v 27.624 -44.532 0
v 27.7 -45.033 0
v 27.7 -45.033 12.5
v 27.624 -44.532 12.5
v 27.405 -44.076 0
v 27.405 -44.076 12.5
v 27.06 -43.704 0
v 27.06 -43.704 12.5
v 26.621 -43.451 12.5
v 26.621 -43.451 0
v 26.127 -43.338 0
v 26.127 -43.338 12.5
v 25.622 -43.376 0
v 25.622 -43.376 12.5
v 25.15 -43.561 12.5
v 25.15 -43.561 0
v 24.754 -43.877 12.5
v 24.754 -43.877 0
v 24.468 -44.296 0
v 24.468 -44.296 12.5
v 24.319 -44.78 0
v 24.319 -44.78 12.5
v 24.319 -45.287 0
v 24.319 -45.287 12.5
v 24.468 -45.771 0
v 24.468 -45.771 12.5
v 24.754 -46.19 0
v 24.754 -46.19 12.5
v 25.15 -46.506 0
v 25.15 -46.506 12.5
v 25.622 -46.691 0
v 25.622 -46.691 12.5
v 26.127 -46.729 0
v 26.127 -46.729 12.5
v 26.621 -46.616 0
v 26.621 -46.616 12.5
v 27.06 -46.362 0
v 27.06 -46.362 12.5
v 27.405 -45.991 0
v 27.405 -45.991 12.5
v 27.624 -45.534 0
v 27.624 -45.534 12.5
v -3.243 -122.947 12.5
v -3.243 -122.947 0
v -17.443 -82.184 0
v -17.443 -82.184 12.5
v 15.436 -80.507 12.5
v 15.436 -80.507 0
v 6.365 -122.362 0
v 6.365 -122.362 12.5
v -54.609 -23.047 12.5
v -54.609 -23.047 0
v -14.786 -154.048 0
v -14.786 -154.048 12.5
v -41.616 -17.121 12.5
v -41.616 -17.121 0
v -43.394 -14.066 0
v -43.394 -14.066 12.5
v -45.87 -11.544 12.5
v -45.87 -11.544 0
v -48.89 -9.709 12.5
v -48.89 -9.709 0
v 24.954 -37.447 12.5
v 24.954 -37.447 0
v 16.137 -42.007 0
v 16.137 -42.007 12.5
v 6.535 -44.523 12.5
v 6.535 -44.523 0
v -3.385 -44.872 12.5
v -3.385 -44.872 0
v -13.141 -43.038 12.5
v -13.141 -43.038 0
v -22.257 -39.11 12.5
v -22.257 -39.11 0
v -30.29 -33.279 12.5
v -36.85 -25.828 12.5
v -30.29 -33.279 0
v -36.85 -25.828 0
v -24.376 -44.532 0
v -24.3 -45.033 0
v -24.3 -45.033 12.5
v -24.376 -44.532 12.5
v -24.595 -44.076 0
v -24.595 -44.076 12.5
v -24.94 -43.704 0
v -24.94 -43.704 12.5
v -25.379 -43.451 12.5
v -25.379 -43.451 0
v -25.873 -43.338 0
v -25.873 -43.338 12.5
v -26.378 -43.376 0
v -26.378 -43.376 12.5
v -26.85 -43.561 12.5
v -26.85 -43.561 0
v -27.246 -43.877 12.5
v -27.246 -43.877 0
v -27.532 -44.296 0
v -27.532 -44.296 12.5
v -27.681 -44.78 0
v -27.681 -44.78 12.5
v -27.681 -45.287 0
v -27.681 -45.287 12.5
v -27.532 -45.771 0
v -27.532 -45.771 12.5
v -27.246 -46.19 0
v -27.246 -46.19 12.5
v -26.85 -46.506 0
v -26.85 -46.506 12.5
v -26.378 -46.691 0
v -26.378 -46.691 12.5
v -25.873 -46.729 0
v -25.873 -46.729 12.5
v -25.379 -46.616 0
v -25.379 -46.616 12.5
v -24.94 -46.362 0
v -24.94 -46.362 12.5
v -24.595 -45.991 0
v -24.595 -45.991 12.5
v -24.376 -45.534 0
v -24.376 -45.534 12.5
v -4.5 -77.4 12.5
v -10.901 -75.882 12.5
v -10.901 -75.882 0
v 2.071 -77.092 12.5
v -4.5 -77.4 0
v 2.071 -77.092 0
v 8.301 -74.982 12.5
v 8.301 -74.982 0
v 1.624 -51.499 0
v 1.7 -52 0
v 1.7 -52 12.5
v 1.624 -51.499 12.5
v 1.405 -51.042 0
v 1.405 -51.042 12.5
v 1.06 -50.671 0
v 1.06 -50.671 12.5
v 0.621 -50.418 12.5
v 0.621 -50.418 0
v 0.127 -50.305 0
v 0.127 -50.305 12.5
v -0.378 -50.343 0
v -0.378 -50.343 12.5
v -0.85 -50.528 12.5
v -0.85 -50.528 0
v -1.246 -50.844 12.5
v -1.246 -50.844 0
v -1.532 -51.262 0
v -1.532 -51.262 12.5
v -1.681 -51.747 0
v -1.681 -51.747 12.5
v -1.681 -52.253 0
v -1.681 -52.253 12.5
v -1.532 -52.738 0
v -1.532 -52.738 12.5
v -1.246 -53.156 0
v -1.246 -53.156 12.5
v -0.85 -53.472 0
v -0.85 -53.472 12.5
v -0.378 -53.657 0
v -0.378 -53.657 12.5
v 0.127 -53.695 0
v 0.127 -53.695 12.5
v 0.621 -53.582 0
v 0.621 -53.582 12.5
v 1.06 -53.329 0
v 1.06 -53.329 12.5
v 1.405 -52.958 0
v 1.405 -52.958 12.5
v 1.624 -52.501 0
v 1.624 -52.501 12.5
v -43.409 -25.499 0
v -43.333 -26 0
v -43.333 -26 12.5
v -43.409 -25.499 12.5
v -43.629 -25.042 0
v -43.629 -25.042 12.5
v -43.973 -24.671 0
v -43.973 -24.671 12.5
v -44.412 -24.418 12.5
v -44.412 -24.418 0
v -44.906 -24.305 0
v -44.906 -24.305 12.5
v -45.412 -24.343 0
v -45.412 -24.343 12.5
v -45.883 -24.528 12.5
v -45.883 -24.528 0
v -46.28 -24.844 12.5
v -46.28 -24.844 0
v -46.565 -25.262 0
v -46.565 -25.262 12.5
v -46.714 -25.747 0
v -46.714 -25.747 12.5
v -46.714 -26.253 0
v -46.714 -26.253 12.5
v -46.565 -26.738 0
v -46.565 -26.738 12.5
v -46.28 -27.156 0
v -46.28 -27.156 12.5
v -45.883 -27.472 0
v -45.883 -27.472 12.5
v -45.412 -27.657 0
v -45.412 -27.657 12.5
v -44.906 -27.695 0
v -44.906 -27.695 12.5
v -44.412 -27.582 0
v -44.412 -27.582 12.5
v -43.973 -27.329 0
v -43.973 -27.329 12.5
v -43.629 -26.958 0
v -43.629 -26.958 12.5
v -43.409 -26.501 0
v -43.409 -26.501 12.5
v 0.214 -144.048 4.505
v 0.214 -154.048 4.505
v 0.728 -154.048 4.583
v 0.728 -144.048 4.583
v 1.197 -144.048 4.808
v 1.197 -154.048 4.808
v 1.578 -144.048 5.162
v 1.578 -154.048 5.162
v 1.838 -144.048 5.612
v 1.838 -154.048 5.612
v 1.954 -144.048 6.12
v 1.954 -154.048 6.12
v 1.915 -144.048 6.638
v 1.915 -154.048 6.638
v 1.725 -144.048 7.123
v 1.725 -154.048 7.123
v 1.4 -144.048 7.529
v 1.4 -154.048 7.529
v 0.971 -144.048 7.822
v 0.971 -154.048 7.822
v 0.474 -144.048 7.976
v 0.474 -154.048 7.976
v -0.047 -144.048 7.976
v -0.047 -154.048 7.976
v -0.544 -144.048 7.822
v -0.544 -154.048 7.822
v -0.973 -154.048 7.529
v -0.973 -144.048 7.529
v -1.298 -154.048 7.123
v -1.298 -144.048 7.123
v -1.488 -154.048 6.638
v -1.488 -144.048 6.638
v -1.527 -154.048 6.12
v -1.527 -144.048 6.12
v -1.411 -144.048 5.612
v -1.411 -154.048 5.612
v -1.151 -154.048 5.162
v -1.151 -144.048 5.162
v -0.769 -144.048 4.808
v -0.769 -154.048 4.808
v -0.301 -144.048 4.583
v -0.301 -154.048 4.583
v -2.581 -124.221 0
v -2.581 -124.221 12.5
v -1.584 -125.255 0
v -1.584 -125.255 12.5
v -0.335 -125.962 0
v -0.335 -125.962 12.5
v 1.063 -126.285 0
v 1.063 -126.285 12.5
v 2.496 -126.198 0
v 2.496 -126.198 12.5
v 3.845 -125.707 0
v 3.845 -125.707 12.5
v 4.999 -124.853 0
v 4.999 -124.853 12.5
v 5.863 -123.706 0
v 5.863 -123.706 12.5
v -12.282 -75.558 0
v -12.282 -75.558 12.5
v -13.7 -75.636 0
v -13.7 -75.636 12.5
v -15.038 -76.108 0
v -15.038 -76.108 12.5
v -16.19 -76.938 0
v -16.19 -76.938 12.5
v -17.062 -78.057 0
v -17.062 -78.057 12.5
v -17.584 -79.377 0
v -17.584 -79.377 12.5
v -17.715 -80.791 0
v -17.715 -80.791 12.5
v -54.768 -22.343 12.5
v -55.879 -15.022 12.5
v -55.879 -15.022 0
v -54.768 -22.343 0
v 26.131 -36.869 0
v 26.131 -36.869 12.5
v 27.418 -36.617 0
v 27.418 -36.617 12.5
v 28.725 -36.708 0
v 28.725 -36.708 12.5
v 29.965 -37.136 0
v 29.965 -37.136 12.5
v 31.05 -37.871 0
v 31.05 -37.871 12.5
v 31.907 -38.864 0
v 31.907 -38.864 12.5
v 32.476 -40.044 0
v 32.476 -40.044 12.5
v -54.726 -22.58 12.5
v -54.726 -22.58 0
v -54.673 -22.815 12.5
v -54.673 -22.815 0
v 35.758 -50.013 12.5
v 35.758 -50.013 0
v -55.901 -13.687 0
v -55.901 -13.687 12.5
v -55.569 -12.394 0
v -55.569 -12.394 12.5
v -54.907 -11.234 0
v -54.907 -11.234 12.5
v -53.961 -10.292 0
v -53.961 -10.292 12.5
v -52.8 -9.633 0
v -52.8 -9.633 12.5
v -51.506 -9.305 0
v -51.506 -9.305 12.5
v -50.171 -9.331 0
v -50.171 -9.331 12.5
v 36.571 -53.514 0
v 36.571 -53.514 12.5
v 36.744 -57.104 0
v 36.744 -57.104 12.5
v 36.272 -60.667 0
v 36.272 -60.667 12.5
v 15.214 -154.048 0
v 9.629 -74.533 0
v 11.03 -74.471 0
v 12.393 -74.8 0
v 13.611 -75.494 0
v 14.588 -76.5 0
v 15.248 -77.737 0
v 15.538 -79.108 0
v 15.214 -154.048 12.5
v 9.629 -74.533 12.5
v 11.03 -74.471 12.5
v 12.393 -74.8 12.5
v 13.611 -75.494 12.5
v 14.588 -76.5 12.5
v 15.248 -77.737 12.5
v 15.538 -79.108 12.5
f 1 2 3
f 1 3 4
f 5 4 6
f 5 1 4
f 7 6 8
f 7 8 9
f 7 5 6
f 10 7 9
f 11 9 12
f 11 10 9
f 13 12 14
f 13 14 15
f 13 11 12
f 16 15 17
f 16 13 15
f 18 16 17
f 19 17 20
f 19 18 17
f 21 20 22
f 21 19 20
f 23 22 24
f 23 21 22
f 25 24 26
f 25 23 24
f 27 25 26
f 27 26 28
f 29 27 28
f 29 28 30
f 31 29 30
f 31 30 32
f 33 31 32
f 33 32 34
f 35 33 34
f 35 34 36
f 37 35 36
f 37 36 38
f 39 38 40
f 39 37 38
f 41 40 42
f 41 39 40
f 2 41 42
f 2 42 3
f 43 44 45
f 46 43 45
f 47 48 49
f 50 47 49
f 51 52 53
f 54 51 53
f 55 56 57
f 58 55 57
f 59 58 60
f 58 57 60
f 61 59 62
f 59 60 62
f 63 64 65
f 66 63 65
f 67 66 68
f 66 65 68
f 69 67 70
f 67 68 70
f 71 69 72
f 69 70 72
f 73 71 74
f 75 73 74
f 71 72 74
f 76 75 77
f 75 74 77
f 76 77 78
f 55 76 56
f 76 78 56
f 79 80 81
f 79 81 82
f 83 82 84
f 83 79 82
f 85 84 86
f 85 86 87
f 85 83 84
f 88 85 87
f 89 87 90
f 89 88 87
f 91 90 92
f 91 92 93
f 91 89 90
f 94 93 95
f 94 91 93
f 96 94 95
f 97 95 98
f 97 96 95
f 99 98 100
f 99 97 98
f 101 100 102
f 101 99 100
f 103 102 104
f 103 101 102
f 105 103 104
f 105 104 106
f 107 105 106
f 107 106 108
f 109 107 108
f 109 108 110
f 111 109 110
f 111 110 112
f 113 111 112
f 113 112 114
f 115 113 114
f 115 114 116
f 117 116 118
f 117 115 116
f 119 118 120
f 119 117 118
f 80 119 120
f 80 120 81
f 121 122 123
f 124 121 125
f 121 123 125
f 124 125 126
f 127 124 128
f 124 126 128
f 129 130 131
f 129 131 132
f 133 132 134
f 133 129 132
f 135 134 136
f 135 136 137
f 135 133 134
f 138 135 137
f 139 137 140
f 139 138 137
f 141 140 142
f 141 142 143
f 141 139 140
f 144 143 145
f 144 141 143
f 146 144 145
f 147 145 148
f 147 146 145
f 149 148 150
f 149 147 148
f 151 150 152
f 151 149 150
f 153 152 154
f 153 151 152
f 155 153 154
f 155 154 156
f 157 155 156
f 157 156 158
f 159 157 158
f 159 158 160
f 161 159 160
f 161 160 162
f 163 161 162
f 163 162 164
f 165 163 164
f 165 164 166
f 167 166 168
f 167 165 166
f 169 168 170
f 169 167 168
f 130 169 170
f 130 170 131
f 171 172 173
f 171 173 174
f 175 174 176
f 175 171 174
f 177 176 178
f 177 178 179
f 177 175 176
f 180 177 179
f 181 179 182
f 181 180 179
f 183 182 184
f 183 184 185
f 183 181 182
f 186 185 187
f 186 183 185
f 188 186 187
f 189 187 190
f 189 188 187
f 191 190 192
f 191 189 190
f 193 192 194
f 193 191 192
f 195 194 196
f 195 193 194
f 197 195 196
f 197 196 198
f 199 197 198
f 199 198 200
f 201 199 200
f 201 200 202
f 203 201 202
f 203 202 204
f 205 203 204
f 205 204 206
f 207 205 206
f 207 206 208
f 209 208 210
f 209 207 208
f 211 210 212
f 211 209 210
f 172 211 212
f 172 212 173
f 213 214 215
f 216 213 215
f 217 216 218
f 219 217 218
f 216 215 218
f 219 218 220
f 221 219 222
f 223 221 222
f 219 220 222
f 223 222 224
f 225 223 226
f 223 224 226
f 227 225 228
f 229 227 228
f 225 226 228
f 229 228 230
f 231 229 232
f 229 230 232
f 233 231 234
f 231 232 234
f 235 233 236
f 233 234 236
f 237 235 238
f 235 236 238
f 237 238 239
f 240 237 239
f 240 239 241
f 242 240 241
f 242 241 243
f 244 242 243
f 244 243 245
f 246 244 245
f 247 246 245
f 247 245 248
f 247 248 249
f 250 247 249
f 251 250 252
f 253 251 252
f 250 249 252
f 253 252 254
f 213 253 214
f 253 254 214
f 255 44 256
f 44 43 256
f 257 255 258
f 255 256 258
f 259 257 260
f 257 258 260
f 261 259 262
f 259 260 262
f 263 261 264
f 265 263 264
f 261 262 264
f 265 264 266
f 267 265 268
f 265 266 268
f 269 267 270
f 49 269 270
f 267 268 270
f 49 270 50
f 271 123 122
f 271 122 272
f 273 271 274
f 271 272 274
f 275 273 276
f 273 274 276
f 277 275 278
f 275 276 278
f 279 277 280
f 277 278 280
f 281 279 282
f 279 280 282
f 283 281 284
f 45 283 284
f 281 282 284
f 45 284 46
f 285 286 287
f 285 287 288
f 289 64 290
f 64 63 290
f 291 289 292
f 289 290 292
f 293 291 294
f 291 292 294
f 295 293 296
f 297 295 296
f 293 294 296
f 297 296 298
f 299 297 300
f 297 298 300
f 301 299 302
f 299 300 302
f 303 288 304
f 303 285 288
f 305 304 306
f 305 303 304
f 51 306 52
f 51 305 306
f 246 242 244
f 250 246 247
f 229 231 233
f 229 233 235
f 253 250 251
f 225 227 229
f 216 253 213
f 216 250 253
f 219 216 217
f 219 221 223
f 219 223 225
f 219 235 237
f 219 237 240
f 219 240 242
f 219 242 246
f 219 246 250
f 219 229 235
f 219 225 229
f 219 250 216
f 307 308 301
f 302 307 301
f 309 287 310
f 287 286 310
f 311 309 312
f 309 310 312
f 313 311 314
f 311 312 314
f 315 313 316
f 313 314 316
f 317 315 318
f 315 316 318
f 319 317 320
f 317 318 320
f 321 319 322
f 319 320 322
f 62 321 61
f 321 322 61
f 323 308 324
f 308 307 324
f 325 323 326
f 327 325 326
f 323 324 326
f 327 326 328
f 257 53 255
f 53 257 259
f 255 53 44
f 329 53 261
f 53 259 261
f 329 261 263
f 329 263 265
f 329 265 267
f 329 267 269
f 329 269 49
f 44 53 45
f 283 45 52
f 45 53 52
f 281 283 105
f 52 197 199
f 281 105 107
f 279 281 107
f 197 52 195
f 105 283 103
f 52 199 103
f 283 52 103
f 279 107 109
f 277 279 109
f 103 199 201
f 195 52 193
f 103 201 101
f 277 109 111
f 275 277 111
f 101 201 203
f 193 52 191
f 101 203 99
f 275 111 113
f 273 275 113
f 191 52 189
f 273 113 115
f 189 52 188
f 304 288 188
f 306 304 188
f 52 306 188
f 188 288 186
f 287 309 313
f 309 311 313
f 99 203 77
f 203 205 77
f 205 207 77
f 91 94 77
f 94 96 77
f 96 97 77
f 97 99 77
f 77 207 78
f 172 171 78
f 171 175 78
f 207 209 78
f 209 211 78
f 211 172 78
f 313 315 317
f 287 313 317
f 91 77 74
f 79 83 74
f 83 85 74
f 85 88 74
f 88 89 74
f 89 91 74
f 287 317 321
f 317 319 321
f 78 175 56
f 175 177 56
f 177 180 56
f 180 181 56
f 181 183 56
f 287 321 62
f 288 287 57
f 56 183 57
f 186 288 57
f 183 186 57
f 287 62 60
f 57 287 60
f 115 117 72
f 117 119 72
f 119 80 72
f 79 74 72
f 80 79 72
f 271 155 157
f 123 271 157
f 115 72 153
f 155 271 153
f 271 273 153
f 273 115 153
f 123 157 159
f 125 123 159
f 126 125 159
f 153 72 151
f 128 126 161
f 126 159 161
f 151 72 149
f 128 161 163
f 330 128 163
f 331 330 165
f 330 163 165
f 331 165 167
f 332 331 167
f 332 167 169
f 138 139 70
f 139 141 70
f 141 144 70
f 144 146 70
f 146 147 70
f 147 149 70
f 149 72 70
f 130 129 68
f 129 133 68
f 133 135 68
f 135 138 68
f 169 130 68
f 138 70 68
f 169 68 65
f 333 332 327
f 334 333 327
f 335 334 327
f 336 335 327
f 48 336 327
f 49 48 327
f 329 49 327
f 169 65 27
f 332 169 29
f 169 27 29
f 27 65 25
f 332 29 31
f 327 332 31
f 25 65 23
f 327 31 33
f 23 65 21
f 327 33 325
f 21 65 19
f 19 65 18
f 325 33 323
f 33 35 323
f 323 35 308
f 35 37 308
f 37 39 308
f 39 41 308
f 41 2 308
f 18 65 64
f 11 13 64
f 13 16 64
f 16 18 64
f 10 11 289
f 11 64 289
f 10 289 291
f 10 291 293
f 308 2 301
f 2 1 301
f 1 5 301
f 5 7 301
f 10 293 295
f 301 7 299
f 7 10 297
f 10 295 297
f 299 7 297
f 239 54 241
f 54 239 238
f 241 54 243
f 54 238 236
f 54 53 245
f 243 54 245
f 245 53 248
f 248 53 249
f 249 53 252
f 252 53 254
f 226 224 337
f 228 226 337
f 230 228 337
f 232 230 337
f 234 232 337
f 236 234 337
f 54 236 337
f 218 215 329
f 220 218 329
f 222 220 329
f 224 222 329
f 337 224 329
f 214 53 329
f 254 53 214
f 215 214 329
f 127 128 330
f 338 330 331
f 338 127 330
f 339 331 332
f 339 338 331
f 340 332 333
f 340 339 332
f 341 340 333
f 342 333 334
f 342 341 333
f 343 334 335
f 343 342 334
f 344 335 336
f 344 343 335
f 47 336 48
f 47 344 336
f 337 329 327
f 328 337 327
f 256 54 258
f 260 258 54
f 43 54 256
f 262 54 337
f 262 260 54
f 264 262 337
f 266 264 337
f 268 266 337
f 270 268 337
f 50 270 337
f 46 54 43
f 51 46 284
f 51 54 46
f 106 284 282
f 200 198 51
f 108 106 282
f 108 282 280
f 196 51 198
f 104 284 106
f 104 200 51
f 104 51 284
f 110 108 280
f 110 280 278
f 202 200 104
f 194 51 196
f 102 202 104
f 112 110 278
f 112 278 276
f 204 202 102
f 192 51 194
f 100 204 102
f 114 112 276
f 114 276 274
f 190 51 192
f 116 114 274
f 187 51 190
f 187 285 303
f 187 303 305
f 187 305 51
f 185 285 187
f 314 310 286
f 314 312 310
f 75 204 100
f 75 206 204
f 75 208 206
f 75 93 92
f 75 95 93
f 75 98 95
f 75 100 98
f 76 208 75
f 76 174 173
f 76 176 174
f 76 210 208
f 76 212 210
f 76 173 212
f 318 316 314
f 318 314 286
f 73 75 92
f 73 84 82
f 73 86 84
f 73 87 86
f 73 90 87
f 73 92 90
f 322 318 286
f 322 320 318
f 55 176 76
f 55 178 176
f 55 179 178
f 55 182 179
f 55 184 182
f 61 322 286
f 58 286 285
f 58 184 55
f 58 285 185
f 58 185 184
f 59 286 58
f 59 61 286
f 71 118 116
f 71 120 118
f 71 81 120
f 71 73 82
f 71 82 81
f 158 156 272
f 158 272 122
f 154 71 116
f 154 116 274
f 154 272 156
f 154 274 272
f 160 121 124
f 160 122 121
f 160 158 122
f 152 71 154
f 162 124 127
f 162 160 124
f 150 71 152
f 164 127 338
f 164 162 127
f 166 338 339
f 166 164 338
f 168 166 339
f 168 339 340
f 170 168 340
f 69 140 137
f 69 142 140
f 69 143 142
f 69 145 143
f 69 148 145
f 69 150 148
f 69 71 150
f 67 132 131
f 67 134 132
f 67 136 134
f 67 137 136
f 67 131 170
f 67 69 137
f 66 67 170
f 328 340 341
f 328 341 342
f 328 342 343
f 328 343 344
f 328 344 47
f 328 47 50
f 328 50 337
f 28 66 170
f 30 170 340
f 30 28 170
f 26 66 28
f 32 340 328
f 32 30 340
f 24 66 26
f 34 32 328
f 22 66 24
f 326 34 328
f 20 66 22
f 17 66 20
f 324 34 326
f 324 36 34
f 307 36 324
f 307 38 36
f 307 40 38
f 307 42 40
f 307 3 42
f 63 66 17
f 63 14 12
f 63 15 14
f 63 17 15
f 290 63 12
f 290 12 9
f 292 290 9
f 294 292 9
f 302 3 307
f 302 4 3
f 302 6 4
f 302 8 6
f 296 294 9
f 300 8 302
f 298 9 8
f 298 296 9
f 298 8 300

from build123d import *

# Parameters (mm, degrees)
SKETCH1_R           = 1.7
BOSS_EXTRUDE1_DEPTH = 12.5
FILLET4_R           = 5
FILLET5_R           = 5
FILLET6_R           = 5
FILLET7_R           = 20
SKETCH2_R           = 1.745
CUT_EXTRUDE1_DEPTH  = 10
CUT_EXTRUDE2_DEPTH  = 35
FILLET8_R           = 5
FILLET9_R           = 5


with BuildPart() as part:
    # Sketch1 → Boss-Extrude1 (new body)
    with BuildSketch(Plane.XY):
        with BuildLine():
            ThreePointArc((-41.615847066, -17.120784823), (-47.779287866, -10.266909246), (-56.849444808, -8.625))
            Line((-56.849444808, -8.625), (-54.713862361, -22.701136402))
            Line((-54.713862361, -22.701136402), (-14.786422414, -154.047675233))
            Line((-14.786422414, -154.047675233), (15.213577586, -154.047675233))
            Line((15.213577586, -154.047675233), (37.488789117, -55.269230384))
            Line((37.488789117, -55.269230384), (30.258636425, -33.307880775))
            ThreePointArc((30.258636425, -33.307880775), (-9.886965016, -43.90043192), (-41.615847066, -17.120784823))
        make_face()
        with Locations((0, -52)):
            Circle(SKETCH1_R, mode=Mode.SUBTRACT)
        with Locations((-45.033320997, -26)):
            Circle(SKETCH1_R, mode=Mode.SUBTRACT)
        with Locations((-26, -45.033320997)):
            Circle(SKETCH1_R, mode=Mode.SUBTRACT)
        with Locations((26, -45.033320997)):
            Circle(SKETCH1_R, mode=Mode.SUBTRACT)
    extrude(amount=BOSS_EXTRUDE1_DEPTH)

    # Fillet4
    fillet4_edges = [part.edges().sort_by_distance(p)[0] for p in [
        (-56.849444808, -8.625, 6.25),
    ]]
    fillet(fillet4_edges, radius=FILLET4_R)

    # Fillet5
    fillet5_edges = [part.edges().sort_by_distance(p)[0] for p in [
        (-54.713862361, -22.701136402, 6.25),
    ]]
    fillet(fillet5_edges, radius=FILLET5_R)

    # Fillet6
    fillet6_edges = [part.edges().sort_by_distance(p)[0] for p in [
        (30.258636425, -33.307880775, 6.25),
    ]]
    fillet(fillet6_edges, radius=FILLET6_R)

    # Fillet7
    fillet7_edges = [part.edges().sort_by_distance(p)[0] for p in [
        (37.488789117, -55.269230384, 6.25),
    ]]
    fillet(fillet7_edges, radius=FILLET7_R)

    # Sketch2 → Cut-Extrude1 (cut)
    with BuildSketch(Plane(origin=(0, -154.047675233, 0), x_dir=(-1, 0, 0), z_dir=(0, -1, 0))):
        with Locations((-0.213577586, -6.25)):
            Circle(SKETCH2_R)
    extrude(amount=-CUT_EXTRUDE1_DEPTH, mode=Mode.SUBTRACT)

    # Sketch3 → Cut-Extrude2 (cut)
    with BuildSketch(Plane(origin=(0, 0, 0), x_dir=(-1, 0, 0), z_dir=(0, 0, -1))):
        with BuildLine():
            Line((-19.010121999, -64.01448337), (-2.601927454, -139.726581059))
            Line((-2.601927454, -139.726581059), (24.588794936, -61.670455578))
            ThreePointArc((24.588794936, -61.670455578), (3.57566323, -77.468147247), (-19.010121999, -64.01448337))
        make_face()
    extrude(amount=-CUT_EXTRUDE2_DEPTH, mode=Mode.SUBTRACT)

    # Fillet8
    fillet8_edges = [part.edges().sort_by_distance(p)[0] for p in [
        (2.601927454, -139.726581059, 6.25),
    ]]
    fillet(fillet8_edges, radius=FILLET8_R)

    # Fillet9
    fillet9_edges = [part.edges().sort_by_distance(p)[0] for p in [
        (19.010121999, -64.01448337, 6.25),
    ]]
    fillet(fillet9_edges, radius=FILLET9_R)
    fillet9_2_edges = [part.edges().sort_by_distance(p)[0] for p in [
        (-24.588794936, -61.670455578, 6.25),
    ]]
    fillet(fillet9_2_edges, radius=FILLET9_R)


solid = part.part
